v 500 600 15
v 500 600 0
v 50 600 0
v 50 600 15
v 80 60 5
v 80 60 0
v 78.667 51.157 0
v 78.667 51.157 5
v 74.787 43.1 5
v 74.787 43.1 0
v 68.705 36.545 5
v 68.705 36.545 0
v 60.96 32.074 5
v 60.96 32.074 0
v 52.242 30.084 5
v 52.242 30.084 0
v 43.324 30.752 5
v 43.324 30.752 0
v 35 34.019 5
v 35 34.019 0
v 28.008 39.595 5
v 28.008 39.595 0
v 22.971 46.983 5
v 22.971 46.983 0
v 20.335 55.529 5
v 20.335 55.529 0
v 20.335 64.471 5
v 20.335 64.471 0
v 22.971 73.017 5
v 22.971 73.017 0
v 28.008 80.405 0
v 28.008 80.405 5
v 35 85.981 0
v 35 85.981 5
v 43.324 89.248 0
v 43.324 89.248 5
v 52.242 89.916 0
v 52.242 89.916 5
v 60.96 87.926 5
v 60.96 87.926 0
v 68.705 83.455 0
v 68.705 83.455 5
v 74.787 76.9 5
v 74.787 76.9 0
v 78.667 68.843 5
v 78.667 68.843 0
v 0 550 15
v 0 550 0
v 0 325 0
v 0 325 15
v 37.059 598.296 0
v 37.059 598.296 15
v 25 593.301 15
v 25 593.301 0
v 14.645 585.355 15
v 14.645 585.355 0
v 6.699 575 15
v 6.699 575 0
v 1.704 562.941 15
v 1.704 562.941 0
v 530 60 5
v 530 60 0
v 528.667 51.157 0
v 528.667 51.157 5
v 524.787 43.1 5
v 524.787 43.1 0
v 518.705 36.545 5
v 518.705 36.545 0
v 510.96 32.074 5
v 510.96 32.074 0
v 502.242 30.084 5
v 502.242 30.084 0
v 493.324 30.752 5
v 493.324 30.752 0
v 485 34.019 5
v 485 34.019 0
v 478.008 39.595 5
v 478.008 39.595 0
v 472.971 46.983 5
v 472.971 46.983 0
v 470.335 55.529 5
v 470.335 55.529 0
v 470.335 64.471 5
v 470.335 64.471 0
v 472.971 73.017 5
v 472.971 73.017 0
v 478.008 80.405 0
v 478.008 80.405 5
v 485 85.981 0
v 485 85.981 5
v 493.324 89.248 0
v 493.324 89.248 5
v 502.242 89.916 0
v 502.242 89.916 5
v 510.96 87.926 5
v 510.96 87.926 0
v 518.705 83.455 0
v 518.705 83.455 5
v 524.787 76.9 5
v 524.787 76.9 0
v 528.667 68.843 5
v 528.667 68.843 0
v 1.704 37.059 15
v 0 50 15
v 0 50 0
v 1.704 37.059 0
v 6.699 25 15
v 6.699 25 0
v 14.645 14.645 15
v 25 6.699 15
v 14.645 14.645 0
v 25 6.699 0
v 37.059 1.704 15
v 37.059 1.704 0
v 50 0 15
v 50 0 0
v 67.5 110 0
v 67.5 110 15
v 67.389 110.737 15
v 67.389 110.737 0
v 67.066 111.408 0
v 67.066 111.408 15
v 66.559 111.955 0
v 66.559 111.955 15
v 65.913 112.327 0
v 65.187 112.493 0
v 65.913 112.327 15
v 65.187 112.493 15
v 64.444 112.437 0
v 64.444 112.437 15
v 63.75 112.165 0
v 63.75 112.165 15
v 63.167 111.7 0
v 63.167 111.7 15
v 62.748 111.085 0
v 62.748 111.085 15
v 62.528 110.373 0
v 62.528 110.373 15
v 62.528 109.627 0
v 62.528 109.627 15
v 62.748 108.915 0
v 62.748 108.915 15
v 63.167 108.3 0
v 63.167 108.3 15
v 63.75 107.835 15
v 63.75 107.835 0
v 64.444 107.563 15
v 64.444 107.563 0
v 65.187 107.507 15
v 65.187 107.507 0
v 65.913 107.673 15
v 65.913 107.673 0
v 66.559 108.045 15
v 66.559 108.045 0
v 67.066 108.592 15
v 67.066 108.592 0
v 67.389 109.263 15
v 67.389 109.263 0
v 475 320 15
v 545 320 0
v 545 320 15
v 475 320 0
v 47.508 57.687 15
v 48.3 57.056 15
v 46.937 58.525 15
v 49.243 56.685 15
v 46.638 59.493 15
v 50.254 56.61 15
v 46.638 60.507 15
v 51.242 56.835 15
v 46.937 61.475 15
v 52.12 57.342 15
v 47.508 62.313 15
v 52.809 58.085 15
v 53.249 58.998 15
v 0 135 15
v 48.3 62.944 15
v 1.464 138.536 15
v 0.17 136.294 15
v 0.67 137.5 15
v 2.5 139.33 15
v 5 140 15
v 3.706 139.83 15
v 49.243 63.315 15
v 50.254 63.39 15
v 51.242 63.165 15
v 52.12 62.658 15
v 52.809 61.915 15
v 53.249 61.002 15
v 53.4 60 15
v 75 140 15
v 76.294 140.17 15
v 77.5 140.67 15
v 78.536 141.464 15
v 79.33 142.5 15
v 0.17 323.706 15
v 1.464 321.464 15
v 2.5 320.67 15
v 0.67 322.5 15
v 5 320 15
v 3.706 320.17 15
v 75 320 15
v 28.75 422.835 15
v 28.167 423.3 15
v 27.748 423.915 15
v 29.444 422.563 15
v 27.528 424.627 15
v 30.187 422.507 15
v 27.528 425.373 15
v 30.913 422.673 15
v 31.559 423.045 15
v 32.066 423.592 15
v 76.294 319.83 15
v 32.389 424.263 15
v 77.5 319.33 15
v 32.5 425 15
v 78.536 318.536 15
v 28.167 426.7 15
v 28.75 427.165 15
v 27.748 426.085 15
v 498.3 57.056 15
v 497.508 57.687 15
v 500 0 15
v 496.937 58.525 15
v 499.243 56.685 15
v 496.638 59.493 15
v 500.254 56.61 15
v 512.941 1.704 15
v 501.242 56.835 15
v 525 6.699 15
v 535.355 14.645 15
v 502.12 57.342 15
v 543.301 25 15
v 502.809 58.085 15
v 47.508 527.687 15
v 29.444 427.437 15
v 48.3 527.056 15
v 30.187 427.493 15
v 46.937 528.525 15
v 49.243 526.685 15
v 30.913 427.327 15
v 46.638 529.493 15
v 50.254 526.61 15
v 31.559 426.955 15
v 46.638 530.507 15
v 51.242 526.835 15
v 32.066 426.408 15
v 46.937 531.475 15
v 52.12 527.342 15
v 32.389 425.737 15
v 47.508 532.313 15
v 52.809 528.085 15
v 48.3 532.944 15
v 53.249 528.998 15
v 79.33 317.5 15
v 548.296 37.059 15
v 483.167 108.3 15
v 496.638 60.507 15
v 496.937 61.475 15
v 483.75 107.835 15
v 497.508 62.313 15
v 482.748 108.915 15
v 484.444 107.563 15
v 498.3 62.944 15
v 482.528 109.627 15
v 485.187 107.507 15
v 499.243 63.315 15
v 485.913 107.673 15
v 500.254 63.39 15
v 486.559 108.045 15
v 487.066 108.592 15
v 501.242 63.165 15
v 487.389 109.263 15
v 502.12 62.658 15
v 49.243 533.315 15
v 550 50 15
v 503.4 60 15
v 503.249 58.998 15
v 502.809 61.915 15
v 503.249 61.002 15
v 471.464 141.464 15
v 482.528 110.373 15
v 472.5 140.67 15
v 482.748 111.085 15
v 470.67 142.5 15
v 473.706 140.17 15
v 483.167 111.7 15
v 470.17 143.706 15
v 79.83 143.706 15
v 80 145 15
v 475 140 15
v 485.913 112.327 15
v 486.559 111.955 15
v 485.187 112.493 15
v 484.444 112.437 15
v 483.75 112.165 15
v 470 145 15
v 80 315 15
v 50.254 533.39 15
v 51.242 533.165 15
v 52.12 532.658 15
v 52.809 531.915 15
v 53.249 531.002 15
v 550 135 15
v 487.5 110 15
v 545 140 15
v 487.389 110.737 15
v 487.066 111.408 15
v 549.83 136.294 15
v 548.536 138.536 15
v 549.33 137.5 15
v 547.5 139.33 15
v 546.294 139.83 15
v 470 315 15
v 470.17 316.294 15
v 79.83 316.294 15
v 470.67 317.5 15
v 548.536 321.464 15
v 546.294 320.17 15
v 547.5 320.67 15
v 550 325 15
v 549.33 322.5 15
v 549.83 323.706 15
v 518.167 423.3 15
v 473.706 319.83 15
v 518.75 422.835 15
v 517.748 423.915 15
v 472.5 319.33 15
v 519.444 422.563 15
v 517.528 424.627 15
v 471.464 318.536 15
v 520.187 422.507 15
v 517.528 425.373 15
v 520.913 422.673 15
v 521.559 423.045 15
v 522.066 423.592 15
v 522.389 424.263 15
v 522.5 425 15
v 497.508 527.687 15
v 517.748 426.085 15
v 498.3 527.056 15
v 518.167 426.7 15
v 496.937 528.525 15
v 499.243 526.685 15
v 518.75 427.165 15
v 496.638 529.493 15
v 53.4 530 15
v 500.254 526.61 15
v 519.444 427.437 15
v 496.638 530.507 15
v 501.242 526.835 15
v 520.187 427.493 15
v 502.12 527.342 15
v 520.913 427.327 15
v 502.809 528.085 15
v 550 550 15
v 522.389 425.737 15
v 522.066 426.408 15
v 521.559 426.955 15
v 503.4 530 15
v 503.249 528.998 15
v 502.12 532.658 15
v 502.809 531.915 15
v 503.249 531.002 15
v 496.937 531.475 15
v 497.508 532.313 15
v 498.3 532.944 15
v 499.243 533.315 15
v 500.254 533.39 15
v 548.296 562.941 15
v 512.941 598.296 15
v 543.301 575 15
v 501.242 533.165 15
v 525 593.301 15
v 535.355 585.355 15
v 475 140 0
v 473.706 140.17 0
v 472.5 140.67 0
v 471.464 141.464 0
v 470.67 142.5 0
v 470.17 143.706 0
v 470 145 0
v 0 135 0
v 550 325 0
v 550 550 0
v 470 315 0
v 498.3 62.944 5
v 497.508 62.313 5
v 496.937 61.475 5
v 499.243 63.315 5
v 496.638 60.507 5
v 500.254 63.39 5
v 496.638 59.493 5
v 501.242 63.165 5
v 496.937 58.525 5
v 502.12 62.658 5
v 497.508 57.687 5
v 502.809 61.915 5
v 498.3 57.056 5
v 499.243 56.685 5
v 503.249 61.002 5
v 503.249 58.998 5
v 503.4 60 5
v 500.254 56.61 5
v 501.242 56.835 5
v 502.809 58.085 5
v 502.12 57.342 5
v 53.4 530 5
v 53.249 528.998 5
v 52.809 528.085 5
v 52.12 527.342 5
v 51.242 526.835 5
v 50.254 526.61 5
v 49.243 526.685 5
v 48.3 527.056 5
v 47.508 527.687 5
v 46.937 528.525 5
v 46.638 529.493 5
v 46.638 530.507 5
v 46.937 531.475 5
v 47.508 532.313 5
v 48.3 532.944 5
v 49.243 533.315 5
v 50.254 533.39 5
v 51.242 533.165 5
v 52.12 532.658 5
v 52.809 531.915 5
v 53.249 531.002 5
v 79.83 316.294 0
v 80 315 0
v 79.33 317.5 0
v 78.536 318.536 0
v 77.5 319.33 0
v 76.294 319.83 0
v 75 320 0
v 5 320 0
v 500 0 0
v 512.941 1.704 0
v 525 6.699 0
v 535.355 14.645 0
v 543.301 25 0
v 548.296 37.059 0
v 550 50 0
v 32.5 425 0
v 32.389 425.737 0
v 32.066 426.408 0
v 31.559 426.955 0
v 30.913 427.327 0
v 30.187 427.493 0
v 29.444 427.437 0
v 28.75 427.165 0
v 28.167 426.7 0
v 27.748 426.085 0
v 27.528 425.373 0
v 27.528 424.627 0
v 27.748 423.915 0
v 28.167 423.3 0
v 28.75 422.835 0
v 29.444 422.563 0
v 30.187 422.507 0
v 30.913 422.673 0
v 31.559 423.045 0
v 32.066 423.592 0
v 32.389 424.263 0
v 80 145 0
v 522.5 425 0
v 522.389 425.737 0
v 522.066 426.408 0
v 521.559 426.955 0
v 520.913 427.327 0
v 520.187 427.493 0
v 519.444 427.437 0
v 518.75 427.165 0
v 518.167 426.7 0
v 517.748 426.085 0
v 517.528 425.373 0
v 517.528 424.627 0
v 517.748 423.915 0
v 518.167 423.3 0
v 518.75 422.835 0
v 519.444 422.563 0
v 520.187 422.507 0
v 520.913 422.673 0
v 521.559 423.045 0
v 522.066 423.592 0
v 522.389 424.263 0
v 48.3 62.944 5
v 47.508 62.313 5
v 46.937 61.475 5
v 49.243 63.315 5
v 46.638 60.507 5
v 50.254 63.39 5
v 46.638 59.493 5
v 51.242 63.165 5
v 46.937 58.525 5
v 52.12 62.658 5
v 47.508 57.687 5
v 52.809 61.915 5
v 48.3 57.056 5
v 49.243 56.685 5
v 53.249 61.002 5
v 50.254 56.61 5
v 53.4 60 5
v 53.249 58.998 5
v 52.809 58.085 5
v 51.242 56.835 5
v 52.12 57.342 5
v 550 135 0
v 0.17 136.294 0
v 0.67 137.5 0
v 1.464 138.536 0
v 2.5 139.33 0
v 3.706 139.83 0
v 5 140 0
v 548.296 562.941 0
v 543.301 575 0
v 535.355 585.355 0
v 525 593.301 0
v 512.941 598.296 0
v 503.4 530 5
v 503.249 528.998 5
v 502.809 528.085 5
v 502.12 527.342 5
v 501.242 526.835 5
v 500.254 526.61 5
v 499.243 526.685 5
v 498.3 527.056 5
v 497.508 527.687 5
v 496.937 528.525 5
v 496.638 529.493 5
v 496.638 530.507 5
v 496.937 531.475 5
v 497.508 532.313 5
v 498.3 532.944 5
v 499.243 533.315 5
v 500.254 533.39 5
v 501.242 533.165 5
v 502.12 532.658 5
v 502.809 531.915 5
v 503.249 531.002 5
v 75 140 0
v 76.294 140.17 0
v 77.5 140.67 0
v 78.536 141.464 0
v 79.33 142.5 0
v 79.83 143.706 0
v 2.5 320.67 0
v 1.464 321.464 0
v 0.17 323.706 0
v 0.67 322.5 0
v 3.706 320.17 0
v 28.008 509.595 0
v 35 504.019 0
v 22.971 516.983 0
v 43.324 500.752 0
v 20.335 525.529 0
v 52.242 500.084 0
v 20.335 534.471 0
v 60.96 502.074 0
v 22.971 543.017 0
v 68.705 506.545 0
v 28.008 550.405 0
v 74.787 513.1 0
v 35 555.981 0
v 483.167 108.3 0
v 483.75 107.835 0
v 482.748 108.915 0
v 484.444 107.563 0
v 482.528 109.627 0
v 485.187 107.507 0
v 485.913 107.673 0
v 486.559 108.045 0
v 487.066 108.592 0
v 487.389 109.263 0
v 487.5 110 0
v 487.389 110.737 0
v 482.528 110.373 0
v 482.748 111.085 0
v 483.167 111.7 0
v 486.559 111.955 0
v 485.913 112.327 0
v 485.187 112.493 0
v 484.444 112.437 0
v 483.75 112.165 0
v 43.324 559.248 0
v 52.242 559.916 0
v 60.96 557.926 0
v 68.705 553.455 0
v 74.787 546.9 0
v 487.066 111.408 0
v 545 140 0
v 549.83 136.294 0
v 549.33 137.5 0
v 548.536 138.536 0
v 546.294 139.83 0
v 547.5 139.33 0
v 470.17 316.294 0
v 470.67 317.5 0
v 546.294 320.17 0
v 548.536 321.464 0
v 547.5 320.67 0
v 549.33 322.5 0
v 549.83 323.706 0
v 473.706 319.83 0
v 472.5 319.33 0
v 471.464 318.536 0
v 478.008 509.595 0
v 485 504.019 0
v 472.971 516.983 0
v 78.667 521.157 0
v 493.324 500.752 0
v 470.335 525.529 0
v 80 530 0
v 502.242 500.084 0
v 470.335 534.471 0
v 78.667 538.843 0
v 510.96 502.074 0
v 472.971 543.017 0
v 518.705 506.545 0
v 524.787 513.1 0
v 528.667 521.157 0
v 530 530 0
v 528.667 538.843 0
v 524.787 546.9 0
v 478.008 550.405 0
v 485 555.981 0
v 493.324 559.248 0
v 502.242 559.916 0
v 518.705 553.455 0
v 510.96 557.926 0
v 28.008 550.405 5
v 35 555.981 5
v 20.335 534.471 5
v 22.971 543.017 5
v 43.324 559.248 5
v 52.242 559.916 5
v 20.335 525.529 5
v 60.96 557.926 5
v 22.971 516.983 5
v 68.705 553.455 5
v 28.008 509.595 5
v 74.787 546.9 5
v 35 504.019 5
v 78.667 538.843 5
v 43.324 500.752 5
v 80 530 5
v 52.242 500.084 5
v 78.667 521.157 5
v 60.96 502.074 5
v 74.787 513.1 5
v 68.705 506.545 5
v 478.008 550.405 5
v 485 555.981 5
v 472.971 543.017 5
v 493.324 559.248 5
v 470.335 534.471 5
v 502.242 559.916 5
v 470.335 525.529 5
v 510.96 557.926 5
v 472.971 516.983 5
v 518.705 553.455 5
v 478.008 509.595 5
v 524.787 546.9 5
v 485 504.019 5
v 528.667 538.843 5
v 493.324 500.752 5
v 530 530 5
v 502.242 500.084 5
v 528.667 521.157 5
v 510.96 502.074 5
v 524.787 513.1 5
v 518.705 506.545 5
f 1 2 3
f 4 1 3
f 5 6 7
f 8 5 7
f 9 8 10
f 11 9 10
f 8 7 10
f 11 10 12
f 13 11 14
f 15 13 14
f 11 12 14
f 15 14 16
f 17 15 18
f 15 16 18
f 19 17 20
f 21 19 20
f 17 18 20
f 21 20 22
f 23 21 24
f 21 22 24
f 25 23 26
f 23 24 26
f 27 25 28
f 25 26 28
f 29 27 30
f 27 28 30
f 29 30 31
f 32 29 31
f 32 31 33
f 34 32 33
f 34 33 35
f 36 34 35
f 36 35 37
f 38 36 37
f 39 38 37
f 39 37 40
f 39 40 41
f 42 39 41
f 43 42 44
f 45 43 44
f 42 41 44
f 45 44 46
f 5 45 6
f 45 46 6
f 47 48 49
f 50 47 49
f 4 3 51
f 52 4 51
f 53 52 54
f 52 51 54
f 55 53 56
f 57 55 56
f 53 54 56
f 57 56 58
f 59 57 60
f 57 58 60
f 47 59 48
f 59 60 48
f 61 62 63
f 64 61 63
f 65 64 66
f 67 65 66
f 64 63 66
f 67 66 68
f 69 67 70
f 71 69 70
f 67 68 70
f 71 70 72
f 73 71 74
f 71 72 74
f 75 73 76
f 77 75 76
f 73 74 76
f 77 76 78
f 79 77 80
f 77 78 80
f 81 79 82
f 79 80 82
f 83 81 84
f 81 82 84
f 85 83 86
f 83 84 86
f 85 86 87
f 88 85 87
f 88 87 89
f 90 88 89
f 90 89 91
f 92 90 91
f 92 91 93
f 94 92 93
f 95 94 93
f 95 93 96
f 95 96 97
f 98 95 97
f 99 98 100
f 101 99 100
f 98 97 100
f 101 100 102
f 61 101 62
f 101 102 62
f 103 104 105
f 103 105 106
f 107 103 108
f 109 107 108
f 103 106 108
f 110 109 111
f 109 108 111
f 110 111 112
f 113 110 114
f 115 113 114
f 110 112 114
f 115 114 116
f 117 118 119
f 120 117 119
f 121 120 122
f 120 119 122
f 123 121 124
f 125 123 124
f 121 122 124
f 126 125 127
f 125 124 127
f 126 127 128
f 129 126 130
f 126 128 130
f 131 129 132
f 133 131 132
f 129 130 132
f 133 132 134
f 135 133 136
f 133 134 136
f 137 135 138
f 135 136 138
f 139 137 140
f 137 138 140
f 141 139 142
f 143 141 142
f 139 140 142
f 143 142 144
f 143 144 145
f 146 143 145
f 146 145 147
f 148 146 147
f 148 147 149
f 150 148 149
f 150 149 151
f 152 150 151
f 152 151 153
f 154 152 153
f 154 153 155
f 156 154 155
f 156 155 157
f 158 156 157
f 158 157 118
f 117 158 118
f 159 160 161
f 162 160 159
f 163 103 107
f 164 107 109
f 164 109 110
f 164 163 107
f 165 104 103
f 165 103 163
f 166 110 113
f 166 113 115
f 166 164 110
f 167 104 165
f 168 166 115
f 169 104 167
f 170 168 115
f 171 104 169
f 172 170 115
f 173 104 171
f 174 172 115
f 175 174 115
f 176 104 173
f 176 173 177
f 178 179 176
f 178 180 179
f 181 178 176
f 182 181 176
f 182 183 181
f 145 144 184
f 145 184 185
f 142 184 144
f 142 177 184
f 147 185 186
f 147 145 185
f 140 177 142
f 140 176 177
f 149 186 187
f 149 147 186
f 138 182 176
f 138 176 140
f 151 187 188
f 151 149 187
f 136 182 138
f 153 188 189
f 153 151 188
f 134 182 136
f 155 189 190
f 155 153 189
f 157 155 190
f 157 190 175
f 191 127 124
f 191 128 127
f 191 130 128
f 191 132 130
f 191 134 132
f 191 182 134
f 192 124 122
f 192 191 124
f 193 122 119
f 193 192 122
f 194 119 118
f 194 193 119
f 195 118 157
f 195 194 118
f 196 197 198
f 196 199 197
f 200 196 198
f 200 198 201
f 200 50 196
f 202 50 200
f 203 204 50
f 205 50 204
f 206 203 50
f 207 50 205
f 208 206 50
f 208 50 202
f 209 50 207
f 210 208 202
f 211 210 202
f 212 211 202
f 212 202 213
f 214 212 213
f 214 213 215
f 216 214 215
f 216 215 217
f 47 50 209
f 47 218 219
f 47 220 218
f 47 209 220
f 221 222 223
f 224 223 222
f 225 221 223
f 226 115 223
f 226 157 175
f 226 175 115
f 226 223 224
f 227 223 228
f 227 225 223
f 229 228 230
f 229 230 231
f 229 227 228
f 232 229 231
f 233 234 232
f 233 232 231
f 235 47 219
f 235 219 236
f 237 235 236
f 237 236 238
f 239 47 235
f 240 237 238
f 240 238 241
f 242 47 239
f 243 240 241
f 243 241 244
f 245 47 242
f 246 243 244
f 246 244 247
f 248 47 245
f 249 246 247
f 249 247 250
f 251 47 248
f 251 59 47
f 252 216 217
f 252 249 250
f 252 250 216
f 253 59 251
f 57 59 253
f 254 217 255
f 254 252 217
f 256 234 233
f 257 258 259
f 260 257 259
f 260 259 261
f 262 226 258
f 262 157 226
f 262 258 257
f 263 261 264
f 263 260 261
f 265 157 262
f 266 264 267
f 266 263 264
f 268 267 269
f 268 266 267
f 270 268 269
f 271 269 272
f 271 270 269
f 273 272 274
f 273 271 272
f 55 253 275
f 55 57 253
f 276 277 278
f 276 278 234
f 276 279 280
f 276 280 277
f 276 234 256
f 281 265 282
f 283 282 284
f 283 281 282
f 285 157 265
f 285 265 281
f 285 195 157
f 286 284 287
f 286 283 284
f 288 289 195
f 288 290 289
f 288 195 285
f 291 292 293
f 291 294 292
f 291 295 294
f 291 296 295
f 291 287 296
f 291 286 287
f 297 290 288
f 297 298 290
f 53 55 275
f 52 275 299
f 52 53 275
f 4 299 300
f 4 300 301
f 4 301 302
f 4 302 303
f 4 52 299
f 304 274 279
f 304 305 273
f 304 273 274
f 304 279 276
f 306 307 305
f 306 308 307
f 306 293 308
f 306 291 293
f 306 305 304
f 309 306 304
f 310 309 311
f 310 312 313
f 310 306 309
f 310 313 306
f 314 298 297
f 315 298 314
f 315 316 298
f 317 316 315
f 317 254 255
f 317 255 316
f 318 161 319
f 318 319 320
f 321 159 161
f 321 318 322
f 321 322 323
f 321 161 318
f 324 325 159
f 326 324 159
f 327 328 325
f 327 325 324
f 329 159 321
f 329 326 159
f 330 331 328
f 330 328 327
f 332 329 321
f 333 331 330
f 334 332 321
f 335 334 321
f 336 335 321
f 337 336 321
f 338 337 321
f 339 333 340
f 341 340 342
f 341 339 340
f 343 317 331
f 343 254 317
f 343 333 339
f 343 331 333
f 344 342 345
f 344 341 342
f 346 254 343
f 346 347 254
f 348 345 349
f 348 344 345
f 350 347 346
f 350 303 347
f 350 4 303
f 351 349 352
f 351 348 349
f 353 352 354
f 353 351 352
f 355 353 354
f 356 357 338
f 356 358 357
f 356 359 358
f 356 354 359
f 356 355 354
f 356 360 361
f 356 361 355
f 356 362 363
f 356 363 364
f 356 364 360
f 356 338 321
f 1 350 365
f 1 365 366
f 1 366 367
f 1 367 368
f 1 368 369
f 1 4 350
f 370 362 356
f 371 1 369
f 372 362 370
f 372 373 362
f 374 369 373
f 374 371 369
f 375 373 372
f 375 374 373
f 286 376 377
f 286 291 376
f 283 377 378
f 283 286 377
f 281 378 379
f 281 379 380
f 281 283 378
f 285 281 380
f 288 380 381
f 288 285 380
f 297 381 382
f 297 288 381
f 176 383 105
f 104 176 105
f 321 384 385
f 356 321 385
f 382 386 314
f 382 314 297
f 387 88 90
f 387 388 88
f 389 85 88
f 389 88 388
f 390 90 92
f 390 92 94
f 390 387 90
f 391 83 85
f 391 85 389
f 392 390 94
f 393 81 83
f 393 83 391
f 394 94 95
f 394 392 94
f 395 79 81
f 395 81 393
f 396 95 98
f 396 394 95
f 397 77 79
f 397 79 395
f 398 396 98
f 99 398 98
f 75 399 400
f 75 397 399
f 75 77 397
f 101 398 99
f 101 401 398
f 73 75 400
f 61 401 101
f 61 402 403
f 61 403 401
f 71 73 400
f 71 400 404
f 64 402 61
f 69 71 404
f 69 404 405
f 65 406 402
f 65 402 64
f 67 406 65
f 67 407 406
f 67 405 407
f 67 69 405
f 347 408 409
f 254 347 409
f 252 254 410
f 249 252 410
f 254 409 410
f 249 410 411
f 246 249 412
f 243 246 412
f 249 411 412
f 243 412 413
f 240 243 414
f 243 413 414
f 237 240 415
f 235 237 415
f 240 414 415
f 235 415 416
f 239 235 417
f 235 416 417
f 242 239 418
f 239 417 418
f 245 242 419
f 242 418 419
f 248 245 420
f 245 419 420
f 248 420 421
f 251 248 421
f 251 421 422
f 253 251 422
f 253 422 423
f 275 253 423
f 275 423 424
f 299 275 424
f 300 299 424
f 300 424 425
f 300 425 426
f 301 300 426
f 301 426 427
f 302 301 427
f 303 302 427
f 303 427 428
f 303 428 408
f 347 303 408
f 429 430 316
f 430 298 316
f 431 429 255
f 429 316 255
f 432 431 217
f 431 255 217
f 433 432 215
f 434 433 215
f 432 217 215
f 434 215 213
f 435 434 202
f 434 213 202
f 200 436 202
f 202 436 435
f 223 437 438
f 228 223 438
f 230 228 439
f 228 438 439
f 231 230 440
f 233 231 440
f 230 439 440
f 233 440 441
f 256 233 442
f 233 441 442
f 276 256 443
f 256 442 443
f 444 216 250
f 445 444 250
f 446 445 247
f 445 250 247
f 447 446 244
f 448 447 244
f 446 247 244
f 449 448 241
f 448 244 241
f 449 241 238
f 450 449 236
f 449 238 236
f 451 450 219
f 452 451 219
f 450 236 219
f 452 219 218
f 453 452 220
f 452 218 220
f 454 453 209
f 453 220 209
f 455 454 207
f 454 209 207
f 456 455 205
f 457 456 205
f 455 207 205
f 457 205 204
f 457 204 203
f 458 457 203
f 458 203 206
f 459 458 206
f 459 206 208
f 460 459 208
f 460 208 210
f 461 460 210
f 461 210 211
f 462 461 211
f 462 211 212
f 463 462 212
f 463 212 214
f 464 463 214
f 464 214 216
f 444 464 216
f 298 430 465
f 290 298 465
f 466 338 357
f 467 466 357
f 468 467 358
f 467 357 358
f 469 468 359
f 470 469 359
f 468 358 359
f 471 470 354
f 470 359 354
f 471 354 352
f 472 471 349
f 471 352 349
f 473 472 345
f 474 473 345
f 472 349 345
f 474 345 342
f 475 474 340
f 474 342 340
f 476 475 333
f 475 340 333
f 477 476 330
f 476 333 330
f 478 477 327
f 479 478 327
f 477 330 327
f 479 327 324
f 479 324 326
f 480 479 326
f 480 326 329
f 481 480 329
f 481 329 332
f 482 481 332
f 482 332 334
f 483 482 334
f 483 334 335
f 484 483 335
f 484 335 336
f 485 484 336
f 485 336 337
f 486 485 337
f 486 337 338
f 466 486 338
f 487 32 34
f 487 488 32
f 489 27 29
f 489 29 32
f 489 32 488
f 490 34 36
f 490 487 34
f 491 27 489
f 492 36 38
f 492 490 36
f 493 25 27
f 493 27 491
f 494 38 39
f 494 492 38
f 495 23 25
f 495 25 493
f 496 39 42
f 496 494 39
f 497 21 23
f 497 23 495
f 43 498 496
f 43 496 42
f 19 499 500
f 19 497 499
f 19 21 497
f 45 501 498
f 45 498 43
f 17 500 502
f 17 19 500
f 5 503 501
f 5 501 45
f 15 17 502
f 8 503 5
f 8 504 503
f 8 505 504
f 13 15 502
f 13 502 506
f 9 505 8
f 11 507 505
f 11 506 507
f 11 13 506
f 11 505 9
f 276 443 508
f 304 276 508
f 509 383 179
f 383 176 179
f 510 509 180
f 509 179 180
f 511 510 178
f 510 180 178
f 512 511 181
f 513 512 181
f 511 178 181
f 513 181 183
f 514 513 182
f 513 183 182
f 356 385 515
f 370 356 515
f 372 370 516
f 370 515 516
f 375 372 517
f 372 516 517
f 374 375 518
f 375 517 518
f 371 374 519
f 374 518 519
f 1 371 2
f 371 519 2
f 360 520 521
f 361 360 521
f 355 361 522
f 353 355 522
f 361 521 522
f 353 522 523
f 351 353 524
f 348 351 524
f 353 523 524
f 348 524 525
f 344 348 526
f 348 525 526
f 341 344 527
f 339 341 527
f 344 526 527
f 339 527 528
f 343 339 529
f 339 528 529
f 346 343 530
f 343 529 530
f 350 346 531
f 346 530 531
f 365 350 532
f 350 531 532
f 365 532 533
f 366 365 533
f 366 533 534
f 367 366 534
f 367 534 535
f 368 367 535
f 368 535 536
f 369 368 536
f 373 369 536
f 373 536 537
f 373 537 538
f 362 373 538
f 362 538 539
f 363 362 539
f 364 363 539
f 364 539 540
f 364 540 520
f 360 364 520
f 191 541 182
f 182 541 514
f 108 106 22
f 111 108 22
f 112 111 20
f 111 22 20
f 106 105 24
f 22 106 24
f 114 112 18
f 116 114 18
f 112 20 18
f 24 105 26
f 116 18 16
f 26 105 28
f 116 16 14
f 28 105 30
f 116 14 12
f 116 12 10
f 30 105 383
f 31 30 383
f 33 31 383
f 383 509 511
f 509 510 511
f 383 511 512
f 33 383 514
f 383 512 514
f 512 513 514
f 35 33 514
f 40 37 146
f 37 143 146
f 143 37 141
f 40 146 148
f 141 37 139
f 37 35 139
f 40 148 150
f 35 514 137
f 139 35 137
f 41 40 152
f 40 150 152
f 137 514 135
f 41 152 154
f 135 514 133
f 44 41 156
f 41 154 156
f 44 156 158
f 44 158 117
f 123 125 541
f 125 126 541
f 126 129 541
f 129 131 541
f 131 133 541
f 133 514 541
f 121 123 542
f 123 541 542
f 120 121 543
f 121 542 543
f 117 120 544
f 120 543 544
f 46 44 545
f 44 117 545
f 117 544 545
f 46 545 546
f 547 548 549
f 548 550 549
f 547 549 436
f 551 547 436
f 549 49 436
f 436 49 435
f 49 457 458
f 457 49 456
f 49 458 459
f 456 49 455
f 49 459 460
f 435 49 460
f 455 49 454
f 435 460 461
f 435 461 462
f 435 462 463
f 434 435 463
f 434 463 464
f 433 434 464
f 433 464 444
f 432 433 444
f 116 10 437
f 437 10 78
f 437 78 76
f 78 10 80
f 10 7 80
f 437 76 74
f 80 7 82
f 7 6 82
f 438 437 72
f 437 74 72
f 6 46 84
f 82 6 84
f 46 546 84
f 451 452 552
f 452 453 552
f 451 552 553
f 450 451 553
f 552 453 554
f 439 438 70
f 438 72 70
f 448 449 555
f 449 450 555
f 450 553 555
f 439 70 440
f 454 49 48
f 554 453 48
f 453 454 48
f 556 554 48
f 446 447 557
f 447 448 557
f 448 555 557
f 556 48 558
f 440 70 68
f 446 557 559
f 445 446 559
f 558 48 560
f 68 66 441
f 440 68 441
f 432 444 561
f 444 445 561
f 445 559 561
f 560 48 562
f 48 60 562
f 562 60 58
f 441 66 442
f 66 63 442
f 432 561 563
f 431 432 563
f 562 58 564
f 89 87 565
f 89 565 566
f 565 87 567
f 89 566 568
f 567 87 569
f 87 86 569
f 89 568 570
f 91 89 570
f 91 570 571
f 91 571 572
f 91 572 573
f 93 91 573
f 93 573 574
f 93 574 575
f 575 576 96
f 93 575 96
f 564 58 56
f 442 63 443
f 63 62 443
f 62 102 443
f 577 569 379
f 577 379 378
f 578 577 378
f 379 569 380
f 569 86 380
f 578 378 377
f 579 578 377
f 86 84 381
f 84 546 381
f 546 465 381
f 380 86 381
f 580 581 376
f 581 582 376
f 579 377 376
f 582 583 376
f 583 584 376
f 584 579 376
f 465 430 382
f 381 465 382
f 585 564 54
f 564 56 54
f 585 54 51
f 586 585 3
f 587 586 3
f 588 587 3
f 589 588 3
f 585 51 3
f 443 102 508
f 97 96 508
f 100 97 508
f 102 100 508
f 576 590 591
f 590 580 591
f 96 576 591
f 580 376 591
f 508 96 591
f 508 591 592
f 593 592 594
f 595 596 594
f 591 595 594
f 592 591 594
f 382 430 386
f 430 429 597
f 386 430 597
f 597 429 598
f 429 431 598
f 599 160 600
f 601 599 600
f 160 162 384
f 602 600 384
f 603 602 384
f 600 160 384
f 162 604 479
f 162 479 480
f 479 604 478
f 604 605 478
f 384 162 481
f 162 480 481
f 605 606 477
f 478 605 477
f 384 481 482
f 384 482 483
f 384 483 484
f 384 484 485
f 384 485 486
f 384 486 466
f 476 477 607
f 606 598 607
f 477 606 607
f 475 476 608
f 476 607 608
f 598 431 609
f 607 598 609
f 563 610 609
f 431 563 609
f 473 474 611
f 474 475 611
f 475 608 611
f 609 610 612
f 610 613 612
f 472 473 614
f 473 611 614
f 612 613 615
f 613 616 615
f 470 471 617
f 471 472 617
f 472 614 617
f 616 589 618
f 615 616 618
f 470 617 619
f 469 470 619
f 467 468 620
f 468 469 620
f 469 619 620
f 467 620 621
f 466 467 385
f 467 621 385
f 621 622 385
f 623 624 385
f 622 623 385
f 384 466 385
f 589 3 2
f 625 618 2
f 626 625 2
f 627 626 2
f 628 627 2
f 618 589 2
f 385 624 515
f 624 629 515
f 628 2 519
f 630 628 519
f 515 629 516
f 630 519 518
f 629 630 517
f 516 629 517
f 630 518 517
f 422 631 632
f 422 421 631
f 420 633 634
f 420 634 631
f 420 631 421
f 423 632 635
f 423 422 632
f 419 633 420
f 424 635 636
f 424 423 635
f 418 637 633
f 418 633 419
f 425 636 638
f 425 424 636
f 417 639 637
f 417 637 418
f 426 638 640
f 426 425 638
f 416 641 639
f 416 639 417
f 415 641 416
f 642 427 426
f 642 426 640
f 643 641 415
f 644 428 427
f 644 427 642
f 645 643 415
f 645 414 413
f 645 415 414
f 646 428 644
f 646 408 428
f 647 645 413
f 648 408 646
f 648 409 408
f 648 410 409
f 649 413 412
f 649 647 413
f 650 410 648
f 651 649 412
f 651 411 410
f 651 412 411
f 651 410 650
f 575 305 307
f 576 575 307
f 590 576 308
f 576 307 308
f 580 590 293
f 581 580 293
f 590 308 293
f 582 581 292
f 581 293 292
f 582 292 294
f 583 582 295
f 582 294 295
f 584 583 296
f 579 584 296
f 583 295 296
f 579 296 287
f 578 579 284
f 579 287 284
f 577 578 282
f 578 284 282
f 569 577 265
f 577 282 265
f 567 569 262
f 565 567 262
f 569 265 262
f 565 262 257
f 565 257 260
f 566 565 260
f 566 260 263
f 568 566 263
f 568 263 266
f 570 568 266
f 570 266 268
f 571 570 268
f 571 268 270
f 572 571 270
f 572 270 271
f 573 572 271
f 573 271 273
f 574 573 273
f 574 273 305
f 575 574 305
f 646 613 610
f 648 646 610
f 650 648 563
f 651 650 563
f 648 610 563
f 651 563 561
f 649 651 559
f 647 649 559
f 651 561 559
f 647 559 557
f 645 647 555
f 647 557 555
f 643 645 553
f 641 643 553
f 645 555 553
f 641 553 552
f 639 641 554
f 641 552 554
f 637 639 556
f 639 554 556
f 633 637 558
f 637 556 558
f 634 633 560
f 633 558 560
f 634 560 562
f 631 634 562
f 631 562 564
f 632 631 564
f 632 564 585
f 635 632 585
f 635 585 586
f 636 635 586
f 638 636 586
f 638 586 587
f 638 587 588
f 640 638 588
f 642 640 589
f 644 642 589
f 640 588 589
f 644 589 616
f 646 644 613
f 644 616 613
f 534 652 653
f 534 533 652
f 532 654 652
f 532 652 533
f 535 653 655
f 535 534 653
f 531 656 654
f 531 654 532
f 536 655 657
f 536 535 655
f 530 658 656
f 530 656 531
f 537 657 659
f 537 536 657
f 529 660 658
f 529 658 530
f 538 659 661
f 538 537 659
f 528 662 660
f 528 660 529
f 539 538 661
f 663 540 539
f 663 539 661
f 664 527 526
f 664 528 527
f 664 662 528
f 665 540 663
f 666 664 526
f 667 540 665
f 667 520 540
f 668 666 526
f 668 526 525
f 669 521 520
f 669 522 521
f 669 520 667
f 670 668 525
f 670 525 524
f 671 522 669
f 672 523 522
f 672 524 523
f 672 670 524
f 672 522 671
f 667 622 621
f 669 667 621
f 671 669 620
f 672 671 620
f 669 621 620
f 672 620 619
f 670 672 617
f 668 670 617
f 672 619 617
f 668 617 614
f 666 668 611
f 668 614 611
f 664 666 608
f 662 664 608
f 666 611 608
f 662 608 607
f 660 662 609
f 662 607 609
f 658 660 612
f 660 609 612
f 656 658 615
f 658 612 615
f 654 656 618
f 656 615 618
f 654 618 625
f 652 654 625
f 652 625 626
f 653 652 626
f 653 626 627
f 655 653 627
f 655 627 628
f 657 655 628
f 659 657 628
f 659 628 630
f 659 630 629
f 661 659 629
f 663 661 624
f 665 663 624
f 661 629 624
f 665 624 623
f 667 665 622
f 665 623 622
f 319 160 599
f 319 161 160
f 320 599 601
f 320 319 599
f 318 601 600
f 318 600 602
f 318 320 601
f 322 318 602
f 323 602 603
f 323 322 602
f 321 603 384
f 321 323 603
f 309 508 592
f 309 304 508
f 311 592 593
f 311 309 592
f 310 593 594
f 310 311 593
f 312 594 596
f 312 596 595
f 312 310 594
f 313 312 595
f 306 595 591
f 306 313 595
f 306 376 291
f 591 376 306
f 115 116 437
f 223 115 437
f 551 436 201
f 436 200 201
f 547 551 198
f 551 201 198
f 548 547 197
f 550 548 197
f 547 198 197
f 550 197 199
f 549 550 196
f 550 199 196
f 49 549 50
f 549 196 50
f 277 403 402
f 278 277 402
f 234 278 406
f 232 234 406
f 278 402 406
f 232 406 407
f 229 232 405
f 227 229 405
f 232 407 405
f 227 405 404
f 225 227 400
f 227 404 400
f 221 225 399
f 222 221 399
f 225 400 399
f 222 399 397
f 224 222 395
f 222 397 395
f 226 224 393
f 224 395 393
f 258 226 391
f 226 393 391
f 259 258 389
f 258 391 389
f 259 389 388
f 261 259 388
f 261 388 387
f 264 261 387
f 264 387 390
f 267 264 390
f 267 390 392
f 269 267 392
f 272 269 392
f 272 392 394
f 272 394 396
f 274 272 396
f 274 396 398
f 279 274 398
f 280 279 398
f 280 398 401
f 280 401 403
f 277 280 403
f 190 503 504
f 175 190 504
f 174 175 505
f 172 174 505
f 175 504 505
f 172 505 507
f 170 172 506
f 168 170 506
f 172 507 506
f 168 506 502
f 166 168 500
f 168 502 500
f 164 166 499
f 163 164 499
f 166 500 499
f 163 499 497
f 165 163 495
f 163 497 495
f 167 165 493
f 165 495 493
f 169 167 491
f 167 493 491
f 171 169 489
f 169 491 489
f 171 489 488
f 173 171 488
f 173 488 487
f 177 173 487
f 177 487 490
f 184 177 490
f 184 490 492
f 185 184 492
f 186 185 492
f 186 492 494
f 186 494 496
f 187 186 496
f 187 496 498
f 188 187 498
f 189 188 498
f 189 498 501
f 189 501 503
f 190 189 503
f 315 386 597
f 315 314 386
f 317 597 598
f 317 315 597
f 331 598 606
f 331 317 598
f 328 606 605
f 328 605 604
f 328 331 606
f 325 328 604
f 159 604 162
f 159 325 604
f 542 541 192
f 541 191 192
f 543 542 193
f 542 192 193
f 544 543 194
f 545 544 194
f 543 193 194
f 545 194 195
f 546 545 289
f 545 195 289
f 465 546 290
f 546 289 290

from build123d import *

# Parameters (mm, degrees)
PAD_DEPTH     = 15
SKETCH001_R   = 30
POCKET_DEPTH  = 5
SKETCH002_R   = 3.4
HOLE_DEPTH    = 15.001
FILLET_R      = 5
SKETCH003_R   = 2.5
HOLE001_DEPTH = 15.001


with BuildPart() as part:
    # Sketch → Pad (new body)
    with BuildSketch(Plane.XY):
        with BuildLine():
            Line((50, 0), (500, 0))
            ThreePointArc((500, 0), (535.355339, 14.644661), (550, 50))
            Line((550, 50), (550, 140))
            Line((470, 140), (550, 140))
            Line((470, 320), (470, 140))
            Line((550, 320), (470, 320))
            Line((550, 320), (550, 550))
            ThreePointArc((550, 550), (535.355339, 585.355339), (500, 600))
            Line((500, 600), (50, 600))
            ThreePointArc((50, 600), (14.644661, 585.355339), (0, 550))
            Line((0, 550), (0, 320))
            Line((0, 320), (80, 320))
            Line((80, 320), (80, 140))
            Line((80, 140), (0, 140))
            Line((0, 140), (0, 50.00011))
            ThreePointArc((0, 50.00011), (14.644622, 14.6447), (50, 0))
        make_face()
    extrude(amount=PAD_DEPTH)

    # Sketch001 (on Face17 of Pad) → Pocket (cut)
    with BuildSketch(Plane(origin=(0, 0, 0), x_dir=(1, 0, 0), z_dir=(0, 0, -1))):
        with Locations((500, -60)):
            Circle(SKETCH001_R)
        with Locations((50, -60)):
            Circle(SKETCH001_R)
        with Locations((500, -530)):
            Circle(SKETCH001_R)
        with Locations((50, -530)):
            Circle(SKETCH001_R)
    extrude(amount=-POCKET_DEPTH, mode=Mode.SUBTRACT)

    # Sketch002 (on Face4 of Pocket) → Hole (cut, through all)
    with BuildSketch(Plane(origin=(0, 0, 0), x_dir=(1, 0, 0), z_dir=(0, 0, -1))):
        with Locations((50, -60)):
            Circle(SKETCH002_R)
        with Locations((500, -60)):
            Circle(SKETCH002_R)
        with Locations((500, -530)):
            Circle(SKETCH002_R)
        with Locations((50, -530)):
            Circle(SKETCH002_R)
    extrude(amount=-HOLE_DEPTH, mode=Mode.SUBTRACT)

    # Fillet
    fillet_edges = [part.edges().sort_by_distance(p)[0] for p in [
        (550, 320, 7.5),
        (550, 140, 7.5),
        (470, 320, 7.5),
        (470, 140, 7.5),
        (80, 140, 7.5),
        (0, 140, 7.5),
        (0, 320, 7.5),
        (80, 320, 7.5),
    ]]
    fillet(fillet_edges, radius=FILLET_R)

    # Sketch003 (on Face5 of Fillet) → Hole001 (cut, through all)
    with BuildSketch(Plane.XY.offset(15)):
        with Locations((30, 425)):
            Circle(SKETCH003_R)
        with Locations((520, 425)):
            Circle(SKETCH003_R)
        with Locations((65, 110)):
            Circle(SKETCH003_R)
        with Locations((485, 110)):
            Circle(SKETCH003_R)
    extrude(amount=-HOLE001_DEPTH, mode=Mode.SUBTRACT)


solid = part.part
